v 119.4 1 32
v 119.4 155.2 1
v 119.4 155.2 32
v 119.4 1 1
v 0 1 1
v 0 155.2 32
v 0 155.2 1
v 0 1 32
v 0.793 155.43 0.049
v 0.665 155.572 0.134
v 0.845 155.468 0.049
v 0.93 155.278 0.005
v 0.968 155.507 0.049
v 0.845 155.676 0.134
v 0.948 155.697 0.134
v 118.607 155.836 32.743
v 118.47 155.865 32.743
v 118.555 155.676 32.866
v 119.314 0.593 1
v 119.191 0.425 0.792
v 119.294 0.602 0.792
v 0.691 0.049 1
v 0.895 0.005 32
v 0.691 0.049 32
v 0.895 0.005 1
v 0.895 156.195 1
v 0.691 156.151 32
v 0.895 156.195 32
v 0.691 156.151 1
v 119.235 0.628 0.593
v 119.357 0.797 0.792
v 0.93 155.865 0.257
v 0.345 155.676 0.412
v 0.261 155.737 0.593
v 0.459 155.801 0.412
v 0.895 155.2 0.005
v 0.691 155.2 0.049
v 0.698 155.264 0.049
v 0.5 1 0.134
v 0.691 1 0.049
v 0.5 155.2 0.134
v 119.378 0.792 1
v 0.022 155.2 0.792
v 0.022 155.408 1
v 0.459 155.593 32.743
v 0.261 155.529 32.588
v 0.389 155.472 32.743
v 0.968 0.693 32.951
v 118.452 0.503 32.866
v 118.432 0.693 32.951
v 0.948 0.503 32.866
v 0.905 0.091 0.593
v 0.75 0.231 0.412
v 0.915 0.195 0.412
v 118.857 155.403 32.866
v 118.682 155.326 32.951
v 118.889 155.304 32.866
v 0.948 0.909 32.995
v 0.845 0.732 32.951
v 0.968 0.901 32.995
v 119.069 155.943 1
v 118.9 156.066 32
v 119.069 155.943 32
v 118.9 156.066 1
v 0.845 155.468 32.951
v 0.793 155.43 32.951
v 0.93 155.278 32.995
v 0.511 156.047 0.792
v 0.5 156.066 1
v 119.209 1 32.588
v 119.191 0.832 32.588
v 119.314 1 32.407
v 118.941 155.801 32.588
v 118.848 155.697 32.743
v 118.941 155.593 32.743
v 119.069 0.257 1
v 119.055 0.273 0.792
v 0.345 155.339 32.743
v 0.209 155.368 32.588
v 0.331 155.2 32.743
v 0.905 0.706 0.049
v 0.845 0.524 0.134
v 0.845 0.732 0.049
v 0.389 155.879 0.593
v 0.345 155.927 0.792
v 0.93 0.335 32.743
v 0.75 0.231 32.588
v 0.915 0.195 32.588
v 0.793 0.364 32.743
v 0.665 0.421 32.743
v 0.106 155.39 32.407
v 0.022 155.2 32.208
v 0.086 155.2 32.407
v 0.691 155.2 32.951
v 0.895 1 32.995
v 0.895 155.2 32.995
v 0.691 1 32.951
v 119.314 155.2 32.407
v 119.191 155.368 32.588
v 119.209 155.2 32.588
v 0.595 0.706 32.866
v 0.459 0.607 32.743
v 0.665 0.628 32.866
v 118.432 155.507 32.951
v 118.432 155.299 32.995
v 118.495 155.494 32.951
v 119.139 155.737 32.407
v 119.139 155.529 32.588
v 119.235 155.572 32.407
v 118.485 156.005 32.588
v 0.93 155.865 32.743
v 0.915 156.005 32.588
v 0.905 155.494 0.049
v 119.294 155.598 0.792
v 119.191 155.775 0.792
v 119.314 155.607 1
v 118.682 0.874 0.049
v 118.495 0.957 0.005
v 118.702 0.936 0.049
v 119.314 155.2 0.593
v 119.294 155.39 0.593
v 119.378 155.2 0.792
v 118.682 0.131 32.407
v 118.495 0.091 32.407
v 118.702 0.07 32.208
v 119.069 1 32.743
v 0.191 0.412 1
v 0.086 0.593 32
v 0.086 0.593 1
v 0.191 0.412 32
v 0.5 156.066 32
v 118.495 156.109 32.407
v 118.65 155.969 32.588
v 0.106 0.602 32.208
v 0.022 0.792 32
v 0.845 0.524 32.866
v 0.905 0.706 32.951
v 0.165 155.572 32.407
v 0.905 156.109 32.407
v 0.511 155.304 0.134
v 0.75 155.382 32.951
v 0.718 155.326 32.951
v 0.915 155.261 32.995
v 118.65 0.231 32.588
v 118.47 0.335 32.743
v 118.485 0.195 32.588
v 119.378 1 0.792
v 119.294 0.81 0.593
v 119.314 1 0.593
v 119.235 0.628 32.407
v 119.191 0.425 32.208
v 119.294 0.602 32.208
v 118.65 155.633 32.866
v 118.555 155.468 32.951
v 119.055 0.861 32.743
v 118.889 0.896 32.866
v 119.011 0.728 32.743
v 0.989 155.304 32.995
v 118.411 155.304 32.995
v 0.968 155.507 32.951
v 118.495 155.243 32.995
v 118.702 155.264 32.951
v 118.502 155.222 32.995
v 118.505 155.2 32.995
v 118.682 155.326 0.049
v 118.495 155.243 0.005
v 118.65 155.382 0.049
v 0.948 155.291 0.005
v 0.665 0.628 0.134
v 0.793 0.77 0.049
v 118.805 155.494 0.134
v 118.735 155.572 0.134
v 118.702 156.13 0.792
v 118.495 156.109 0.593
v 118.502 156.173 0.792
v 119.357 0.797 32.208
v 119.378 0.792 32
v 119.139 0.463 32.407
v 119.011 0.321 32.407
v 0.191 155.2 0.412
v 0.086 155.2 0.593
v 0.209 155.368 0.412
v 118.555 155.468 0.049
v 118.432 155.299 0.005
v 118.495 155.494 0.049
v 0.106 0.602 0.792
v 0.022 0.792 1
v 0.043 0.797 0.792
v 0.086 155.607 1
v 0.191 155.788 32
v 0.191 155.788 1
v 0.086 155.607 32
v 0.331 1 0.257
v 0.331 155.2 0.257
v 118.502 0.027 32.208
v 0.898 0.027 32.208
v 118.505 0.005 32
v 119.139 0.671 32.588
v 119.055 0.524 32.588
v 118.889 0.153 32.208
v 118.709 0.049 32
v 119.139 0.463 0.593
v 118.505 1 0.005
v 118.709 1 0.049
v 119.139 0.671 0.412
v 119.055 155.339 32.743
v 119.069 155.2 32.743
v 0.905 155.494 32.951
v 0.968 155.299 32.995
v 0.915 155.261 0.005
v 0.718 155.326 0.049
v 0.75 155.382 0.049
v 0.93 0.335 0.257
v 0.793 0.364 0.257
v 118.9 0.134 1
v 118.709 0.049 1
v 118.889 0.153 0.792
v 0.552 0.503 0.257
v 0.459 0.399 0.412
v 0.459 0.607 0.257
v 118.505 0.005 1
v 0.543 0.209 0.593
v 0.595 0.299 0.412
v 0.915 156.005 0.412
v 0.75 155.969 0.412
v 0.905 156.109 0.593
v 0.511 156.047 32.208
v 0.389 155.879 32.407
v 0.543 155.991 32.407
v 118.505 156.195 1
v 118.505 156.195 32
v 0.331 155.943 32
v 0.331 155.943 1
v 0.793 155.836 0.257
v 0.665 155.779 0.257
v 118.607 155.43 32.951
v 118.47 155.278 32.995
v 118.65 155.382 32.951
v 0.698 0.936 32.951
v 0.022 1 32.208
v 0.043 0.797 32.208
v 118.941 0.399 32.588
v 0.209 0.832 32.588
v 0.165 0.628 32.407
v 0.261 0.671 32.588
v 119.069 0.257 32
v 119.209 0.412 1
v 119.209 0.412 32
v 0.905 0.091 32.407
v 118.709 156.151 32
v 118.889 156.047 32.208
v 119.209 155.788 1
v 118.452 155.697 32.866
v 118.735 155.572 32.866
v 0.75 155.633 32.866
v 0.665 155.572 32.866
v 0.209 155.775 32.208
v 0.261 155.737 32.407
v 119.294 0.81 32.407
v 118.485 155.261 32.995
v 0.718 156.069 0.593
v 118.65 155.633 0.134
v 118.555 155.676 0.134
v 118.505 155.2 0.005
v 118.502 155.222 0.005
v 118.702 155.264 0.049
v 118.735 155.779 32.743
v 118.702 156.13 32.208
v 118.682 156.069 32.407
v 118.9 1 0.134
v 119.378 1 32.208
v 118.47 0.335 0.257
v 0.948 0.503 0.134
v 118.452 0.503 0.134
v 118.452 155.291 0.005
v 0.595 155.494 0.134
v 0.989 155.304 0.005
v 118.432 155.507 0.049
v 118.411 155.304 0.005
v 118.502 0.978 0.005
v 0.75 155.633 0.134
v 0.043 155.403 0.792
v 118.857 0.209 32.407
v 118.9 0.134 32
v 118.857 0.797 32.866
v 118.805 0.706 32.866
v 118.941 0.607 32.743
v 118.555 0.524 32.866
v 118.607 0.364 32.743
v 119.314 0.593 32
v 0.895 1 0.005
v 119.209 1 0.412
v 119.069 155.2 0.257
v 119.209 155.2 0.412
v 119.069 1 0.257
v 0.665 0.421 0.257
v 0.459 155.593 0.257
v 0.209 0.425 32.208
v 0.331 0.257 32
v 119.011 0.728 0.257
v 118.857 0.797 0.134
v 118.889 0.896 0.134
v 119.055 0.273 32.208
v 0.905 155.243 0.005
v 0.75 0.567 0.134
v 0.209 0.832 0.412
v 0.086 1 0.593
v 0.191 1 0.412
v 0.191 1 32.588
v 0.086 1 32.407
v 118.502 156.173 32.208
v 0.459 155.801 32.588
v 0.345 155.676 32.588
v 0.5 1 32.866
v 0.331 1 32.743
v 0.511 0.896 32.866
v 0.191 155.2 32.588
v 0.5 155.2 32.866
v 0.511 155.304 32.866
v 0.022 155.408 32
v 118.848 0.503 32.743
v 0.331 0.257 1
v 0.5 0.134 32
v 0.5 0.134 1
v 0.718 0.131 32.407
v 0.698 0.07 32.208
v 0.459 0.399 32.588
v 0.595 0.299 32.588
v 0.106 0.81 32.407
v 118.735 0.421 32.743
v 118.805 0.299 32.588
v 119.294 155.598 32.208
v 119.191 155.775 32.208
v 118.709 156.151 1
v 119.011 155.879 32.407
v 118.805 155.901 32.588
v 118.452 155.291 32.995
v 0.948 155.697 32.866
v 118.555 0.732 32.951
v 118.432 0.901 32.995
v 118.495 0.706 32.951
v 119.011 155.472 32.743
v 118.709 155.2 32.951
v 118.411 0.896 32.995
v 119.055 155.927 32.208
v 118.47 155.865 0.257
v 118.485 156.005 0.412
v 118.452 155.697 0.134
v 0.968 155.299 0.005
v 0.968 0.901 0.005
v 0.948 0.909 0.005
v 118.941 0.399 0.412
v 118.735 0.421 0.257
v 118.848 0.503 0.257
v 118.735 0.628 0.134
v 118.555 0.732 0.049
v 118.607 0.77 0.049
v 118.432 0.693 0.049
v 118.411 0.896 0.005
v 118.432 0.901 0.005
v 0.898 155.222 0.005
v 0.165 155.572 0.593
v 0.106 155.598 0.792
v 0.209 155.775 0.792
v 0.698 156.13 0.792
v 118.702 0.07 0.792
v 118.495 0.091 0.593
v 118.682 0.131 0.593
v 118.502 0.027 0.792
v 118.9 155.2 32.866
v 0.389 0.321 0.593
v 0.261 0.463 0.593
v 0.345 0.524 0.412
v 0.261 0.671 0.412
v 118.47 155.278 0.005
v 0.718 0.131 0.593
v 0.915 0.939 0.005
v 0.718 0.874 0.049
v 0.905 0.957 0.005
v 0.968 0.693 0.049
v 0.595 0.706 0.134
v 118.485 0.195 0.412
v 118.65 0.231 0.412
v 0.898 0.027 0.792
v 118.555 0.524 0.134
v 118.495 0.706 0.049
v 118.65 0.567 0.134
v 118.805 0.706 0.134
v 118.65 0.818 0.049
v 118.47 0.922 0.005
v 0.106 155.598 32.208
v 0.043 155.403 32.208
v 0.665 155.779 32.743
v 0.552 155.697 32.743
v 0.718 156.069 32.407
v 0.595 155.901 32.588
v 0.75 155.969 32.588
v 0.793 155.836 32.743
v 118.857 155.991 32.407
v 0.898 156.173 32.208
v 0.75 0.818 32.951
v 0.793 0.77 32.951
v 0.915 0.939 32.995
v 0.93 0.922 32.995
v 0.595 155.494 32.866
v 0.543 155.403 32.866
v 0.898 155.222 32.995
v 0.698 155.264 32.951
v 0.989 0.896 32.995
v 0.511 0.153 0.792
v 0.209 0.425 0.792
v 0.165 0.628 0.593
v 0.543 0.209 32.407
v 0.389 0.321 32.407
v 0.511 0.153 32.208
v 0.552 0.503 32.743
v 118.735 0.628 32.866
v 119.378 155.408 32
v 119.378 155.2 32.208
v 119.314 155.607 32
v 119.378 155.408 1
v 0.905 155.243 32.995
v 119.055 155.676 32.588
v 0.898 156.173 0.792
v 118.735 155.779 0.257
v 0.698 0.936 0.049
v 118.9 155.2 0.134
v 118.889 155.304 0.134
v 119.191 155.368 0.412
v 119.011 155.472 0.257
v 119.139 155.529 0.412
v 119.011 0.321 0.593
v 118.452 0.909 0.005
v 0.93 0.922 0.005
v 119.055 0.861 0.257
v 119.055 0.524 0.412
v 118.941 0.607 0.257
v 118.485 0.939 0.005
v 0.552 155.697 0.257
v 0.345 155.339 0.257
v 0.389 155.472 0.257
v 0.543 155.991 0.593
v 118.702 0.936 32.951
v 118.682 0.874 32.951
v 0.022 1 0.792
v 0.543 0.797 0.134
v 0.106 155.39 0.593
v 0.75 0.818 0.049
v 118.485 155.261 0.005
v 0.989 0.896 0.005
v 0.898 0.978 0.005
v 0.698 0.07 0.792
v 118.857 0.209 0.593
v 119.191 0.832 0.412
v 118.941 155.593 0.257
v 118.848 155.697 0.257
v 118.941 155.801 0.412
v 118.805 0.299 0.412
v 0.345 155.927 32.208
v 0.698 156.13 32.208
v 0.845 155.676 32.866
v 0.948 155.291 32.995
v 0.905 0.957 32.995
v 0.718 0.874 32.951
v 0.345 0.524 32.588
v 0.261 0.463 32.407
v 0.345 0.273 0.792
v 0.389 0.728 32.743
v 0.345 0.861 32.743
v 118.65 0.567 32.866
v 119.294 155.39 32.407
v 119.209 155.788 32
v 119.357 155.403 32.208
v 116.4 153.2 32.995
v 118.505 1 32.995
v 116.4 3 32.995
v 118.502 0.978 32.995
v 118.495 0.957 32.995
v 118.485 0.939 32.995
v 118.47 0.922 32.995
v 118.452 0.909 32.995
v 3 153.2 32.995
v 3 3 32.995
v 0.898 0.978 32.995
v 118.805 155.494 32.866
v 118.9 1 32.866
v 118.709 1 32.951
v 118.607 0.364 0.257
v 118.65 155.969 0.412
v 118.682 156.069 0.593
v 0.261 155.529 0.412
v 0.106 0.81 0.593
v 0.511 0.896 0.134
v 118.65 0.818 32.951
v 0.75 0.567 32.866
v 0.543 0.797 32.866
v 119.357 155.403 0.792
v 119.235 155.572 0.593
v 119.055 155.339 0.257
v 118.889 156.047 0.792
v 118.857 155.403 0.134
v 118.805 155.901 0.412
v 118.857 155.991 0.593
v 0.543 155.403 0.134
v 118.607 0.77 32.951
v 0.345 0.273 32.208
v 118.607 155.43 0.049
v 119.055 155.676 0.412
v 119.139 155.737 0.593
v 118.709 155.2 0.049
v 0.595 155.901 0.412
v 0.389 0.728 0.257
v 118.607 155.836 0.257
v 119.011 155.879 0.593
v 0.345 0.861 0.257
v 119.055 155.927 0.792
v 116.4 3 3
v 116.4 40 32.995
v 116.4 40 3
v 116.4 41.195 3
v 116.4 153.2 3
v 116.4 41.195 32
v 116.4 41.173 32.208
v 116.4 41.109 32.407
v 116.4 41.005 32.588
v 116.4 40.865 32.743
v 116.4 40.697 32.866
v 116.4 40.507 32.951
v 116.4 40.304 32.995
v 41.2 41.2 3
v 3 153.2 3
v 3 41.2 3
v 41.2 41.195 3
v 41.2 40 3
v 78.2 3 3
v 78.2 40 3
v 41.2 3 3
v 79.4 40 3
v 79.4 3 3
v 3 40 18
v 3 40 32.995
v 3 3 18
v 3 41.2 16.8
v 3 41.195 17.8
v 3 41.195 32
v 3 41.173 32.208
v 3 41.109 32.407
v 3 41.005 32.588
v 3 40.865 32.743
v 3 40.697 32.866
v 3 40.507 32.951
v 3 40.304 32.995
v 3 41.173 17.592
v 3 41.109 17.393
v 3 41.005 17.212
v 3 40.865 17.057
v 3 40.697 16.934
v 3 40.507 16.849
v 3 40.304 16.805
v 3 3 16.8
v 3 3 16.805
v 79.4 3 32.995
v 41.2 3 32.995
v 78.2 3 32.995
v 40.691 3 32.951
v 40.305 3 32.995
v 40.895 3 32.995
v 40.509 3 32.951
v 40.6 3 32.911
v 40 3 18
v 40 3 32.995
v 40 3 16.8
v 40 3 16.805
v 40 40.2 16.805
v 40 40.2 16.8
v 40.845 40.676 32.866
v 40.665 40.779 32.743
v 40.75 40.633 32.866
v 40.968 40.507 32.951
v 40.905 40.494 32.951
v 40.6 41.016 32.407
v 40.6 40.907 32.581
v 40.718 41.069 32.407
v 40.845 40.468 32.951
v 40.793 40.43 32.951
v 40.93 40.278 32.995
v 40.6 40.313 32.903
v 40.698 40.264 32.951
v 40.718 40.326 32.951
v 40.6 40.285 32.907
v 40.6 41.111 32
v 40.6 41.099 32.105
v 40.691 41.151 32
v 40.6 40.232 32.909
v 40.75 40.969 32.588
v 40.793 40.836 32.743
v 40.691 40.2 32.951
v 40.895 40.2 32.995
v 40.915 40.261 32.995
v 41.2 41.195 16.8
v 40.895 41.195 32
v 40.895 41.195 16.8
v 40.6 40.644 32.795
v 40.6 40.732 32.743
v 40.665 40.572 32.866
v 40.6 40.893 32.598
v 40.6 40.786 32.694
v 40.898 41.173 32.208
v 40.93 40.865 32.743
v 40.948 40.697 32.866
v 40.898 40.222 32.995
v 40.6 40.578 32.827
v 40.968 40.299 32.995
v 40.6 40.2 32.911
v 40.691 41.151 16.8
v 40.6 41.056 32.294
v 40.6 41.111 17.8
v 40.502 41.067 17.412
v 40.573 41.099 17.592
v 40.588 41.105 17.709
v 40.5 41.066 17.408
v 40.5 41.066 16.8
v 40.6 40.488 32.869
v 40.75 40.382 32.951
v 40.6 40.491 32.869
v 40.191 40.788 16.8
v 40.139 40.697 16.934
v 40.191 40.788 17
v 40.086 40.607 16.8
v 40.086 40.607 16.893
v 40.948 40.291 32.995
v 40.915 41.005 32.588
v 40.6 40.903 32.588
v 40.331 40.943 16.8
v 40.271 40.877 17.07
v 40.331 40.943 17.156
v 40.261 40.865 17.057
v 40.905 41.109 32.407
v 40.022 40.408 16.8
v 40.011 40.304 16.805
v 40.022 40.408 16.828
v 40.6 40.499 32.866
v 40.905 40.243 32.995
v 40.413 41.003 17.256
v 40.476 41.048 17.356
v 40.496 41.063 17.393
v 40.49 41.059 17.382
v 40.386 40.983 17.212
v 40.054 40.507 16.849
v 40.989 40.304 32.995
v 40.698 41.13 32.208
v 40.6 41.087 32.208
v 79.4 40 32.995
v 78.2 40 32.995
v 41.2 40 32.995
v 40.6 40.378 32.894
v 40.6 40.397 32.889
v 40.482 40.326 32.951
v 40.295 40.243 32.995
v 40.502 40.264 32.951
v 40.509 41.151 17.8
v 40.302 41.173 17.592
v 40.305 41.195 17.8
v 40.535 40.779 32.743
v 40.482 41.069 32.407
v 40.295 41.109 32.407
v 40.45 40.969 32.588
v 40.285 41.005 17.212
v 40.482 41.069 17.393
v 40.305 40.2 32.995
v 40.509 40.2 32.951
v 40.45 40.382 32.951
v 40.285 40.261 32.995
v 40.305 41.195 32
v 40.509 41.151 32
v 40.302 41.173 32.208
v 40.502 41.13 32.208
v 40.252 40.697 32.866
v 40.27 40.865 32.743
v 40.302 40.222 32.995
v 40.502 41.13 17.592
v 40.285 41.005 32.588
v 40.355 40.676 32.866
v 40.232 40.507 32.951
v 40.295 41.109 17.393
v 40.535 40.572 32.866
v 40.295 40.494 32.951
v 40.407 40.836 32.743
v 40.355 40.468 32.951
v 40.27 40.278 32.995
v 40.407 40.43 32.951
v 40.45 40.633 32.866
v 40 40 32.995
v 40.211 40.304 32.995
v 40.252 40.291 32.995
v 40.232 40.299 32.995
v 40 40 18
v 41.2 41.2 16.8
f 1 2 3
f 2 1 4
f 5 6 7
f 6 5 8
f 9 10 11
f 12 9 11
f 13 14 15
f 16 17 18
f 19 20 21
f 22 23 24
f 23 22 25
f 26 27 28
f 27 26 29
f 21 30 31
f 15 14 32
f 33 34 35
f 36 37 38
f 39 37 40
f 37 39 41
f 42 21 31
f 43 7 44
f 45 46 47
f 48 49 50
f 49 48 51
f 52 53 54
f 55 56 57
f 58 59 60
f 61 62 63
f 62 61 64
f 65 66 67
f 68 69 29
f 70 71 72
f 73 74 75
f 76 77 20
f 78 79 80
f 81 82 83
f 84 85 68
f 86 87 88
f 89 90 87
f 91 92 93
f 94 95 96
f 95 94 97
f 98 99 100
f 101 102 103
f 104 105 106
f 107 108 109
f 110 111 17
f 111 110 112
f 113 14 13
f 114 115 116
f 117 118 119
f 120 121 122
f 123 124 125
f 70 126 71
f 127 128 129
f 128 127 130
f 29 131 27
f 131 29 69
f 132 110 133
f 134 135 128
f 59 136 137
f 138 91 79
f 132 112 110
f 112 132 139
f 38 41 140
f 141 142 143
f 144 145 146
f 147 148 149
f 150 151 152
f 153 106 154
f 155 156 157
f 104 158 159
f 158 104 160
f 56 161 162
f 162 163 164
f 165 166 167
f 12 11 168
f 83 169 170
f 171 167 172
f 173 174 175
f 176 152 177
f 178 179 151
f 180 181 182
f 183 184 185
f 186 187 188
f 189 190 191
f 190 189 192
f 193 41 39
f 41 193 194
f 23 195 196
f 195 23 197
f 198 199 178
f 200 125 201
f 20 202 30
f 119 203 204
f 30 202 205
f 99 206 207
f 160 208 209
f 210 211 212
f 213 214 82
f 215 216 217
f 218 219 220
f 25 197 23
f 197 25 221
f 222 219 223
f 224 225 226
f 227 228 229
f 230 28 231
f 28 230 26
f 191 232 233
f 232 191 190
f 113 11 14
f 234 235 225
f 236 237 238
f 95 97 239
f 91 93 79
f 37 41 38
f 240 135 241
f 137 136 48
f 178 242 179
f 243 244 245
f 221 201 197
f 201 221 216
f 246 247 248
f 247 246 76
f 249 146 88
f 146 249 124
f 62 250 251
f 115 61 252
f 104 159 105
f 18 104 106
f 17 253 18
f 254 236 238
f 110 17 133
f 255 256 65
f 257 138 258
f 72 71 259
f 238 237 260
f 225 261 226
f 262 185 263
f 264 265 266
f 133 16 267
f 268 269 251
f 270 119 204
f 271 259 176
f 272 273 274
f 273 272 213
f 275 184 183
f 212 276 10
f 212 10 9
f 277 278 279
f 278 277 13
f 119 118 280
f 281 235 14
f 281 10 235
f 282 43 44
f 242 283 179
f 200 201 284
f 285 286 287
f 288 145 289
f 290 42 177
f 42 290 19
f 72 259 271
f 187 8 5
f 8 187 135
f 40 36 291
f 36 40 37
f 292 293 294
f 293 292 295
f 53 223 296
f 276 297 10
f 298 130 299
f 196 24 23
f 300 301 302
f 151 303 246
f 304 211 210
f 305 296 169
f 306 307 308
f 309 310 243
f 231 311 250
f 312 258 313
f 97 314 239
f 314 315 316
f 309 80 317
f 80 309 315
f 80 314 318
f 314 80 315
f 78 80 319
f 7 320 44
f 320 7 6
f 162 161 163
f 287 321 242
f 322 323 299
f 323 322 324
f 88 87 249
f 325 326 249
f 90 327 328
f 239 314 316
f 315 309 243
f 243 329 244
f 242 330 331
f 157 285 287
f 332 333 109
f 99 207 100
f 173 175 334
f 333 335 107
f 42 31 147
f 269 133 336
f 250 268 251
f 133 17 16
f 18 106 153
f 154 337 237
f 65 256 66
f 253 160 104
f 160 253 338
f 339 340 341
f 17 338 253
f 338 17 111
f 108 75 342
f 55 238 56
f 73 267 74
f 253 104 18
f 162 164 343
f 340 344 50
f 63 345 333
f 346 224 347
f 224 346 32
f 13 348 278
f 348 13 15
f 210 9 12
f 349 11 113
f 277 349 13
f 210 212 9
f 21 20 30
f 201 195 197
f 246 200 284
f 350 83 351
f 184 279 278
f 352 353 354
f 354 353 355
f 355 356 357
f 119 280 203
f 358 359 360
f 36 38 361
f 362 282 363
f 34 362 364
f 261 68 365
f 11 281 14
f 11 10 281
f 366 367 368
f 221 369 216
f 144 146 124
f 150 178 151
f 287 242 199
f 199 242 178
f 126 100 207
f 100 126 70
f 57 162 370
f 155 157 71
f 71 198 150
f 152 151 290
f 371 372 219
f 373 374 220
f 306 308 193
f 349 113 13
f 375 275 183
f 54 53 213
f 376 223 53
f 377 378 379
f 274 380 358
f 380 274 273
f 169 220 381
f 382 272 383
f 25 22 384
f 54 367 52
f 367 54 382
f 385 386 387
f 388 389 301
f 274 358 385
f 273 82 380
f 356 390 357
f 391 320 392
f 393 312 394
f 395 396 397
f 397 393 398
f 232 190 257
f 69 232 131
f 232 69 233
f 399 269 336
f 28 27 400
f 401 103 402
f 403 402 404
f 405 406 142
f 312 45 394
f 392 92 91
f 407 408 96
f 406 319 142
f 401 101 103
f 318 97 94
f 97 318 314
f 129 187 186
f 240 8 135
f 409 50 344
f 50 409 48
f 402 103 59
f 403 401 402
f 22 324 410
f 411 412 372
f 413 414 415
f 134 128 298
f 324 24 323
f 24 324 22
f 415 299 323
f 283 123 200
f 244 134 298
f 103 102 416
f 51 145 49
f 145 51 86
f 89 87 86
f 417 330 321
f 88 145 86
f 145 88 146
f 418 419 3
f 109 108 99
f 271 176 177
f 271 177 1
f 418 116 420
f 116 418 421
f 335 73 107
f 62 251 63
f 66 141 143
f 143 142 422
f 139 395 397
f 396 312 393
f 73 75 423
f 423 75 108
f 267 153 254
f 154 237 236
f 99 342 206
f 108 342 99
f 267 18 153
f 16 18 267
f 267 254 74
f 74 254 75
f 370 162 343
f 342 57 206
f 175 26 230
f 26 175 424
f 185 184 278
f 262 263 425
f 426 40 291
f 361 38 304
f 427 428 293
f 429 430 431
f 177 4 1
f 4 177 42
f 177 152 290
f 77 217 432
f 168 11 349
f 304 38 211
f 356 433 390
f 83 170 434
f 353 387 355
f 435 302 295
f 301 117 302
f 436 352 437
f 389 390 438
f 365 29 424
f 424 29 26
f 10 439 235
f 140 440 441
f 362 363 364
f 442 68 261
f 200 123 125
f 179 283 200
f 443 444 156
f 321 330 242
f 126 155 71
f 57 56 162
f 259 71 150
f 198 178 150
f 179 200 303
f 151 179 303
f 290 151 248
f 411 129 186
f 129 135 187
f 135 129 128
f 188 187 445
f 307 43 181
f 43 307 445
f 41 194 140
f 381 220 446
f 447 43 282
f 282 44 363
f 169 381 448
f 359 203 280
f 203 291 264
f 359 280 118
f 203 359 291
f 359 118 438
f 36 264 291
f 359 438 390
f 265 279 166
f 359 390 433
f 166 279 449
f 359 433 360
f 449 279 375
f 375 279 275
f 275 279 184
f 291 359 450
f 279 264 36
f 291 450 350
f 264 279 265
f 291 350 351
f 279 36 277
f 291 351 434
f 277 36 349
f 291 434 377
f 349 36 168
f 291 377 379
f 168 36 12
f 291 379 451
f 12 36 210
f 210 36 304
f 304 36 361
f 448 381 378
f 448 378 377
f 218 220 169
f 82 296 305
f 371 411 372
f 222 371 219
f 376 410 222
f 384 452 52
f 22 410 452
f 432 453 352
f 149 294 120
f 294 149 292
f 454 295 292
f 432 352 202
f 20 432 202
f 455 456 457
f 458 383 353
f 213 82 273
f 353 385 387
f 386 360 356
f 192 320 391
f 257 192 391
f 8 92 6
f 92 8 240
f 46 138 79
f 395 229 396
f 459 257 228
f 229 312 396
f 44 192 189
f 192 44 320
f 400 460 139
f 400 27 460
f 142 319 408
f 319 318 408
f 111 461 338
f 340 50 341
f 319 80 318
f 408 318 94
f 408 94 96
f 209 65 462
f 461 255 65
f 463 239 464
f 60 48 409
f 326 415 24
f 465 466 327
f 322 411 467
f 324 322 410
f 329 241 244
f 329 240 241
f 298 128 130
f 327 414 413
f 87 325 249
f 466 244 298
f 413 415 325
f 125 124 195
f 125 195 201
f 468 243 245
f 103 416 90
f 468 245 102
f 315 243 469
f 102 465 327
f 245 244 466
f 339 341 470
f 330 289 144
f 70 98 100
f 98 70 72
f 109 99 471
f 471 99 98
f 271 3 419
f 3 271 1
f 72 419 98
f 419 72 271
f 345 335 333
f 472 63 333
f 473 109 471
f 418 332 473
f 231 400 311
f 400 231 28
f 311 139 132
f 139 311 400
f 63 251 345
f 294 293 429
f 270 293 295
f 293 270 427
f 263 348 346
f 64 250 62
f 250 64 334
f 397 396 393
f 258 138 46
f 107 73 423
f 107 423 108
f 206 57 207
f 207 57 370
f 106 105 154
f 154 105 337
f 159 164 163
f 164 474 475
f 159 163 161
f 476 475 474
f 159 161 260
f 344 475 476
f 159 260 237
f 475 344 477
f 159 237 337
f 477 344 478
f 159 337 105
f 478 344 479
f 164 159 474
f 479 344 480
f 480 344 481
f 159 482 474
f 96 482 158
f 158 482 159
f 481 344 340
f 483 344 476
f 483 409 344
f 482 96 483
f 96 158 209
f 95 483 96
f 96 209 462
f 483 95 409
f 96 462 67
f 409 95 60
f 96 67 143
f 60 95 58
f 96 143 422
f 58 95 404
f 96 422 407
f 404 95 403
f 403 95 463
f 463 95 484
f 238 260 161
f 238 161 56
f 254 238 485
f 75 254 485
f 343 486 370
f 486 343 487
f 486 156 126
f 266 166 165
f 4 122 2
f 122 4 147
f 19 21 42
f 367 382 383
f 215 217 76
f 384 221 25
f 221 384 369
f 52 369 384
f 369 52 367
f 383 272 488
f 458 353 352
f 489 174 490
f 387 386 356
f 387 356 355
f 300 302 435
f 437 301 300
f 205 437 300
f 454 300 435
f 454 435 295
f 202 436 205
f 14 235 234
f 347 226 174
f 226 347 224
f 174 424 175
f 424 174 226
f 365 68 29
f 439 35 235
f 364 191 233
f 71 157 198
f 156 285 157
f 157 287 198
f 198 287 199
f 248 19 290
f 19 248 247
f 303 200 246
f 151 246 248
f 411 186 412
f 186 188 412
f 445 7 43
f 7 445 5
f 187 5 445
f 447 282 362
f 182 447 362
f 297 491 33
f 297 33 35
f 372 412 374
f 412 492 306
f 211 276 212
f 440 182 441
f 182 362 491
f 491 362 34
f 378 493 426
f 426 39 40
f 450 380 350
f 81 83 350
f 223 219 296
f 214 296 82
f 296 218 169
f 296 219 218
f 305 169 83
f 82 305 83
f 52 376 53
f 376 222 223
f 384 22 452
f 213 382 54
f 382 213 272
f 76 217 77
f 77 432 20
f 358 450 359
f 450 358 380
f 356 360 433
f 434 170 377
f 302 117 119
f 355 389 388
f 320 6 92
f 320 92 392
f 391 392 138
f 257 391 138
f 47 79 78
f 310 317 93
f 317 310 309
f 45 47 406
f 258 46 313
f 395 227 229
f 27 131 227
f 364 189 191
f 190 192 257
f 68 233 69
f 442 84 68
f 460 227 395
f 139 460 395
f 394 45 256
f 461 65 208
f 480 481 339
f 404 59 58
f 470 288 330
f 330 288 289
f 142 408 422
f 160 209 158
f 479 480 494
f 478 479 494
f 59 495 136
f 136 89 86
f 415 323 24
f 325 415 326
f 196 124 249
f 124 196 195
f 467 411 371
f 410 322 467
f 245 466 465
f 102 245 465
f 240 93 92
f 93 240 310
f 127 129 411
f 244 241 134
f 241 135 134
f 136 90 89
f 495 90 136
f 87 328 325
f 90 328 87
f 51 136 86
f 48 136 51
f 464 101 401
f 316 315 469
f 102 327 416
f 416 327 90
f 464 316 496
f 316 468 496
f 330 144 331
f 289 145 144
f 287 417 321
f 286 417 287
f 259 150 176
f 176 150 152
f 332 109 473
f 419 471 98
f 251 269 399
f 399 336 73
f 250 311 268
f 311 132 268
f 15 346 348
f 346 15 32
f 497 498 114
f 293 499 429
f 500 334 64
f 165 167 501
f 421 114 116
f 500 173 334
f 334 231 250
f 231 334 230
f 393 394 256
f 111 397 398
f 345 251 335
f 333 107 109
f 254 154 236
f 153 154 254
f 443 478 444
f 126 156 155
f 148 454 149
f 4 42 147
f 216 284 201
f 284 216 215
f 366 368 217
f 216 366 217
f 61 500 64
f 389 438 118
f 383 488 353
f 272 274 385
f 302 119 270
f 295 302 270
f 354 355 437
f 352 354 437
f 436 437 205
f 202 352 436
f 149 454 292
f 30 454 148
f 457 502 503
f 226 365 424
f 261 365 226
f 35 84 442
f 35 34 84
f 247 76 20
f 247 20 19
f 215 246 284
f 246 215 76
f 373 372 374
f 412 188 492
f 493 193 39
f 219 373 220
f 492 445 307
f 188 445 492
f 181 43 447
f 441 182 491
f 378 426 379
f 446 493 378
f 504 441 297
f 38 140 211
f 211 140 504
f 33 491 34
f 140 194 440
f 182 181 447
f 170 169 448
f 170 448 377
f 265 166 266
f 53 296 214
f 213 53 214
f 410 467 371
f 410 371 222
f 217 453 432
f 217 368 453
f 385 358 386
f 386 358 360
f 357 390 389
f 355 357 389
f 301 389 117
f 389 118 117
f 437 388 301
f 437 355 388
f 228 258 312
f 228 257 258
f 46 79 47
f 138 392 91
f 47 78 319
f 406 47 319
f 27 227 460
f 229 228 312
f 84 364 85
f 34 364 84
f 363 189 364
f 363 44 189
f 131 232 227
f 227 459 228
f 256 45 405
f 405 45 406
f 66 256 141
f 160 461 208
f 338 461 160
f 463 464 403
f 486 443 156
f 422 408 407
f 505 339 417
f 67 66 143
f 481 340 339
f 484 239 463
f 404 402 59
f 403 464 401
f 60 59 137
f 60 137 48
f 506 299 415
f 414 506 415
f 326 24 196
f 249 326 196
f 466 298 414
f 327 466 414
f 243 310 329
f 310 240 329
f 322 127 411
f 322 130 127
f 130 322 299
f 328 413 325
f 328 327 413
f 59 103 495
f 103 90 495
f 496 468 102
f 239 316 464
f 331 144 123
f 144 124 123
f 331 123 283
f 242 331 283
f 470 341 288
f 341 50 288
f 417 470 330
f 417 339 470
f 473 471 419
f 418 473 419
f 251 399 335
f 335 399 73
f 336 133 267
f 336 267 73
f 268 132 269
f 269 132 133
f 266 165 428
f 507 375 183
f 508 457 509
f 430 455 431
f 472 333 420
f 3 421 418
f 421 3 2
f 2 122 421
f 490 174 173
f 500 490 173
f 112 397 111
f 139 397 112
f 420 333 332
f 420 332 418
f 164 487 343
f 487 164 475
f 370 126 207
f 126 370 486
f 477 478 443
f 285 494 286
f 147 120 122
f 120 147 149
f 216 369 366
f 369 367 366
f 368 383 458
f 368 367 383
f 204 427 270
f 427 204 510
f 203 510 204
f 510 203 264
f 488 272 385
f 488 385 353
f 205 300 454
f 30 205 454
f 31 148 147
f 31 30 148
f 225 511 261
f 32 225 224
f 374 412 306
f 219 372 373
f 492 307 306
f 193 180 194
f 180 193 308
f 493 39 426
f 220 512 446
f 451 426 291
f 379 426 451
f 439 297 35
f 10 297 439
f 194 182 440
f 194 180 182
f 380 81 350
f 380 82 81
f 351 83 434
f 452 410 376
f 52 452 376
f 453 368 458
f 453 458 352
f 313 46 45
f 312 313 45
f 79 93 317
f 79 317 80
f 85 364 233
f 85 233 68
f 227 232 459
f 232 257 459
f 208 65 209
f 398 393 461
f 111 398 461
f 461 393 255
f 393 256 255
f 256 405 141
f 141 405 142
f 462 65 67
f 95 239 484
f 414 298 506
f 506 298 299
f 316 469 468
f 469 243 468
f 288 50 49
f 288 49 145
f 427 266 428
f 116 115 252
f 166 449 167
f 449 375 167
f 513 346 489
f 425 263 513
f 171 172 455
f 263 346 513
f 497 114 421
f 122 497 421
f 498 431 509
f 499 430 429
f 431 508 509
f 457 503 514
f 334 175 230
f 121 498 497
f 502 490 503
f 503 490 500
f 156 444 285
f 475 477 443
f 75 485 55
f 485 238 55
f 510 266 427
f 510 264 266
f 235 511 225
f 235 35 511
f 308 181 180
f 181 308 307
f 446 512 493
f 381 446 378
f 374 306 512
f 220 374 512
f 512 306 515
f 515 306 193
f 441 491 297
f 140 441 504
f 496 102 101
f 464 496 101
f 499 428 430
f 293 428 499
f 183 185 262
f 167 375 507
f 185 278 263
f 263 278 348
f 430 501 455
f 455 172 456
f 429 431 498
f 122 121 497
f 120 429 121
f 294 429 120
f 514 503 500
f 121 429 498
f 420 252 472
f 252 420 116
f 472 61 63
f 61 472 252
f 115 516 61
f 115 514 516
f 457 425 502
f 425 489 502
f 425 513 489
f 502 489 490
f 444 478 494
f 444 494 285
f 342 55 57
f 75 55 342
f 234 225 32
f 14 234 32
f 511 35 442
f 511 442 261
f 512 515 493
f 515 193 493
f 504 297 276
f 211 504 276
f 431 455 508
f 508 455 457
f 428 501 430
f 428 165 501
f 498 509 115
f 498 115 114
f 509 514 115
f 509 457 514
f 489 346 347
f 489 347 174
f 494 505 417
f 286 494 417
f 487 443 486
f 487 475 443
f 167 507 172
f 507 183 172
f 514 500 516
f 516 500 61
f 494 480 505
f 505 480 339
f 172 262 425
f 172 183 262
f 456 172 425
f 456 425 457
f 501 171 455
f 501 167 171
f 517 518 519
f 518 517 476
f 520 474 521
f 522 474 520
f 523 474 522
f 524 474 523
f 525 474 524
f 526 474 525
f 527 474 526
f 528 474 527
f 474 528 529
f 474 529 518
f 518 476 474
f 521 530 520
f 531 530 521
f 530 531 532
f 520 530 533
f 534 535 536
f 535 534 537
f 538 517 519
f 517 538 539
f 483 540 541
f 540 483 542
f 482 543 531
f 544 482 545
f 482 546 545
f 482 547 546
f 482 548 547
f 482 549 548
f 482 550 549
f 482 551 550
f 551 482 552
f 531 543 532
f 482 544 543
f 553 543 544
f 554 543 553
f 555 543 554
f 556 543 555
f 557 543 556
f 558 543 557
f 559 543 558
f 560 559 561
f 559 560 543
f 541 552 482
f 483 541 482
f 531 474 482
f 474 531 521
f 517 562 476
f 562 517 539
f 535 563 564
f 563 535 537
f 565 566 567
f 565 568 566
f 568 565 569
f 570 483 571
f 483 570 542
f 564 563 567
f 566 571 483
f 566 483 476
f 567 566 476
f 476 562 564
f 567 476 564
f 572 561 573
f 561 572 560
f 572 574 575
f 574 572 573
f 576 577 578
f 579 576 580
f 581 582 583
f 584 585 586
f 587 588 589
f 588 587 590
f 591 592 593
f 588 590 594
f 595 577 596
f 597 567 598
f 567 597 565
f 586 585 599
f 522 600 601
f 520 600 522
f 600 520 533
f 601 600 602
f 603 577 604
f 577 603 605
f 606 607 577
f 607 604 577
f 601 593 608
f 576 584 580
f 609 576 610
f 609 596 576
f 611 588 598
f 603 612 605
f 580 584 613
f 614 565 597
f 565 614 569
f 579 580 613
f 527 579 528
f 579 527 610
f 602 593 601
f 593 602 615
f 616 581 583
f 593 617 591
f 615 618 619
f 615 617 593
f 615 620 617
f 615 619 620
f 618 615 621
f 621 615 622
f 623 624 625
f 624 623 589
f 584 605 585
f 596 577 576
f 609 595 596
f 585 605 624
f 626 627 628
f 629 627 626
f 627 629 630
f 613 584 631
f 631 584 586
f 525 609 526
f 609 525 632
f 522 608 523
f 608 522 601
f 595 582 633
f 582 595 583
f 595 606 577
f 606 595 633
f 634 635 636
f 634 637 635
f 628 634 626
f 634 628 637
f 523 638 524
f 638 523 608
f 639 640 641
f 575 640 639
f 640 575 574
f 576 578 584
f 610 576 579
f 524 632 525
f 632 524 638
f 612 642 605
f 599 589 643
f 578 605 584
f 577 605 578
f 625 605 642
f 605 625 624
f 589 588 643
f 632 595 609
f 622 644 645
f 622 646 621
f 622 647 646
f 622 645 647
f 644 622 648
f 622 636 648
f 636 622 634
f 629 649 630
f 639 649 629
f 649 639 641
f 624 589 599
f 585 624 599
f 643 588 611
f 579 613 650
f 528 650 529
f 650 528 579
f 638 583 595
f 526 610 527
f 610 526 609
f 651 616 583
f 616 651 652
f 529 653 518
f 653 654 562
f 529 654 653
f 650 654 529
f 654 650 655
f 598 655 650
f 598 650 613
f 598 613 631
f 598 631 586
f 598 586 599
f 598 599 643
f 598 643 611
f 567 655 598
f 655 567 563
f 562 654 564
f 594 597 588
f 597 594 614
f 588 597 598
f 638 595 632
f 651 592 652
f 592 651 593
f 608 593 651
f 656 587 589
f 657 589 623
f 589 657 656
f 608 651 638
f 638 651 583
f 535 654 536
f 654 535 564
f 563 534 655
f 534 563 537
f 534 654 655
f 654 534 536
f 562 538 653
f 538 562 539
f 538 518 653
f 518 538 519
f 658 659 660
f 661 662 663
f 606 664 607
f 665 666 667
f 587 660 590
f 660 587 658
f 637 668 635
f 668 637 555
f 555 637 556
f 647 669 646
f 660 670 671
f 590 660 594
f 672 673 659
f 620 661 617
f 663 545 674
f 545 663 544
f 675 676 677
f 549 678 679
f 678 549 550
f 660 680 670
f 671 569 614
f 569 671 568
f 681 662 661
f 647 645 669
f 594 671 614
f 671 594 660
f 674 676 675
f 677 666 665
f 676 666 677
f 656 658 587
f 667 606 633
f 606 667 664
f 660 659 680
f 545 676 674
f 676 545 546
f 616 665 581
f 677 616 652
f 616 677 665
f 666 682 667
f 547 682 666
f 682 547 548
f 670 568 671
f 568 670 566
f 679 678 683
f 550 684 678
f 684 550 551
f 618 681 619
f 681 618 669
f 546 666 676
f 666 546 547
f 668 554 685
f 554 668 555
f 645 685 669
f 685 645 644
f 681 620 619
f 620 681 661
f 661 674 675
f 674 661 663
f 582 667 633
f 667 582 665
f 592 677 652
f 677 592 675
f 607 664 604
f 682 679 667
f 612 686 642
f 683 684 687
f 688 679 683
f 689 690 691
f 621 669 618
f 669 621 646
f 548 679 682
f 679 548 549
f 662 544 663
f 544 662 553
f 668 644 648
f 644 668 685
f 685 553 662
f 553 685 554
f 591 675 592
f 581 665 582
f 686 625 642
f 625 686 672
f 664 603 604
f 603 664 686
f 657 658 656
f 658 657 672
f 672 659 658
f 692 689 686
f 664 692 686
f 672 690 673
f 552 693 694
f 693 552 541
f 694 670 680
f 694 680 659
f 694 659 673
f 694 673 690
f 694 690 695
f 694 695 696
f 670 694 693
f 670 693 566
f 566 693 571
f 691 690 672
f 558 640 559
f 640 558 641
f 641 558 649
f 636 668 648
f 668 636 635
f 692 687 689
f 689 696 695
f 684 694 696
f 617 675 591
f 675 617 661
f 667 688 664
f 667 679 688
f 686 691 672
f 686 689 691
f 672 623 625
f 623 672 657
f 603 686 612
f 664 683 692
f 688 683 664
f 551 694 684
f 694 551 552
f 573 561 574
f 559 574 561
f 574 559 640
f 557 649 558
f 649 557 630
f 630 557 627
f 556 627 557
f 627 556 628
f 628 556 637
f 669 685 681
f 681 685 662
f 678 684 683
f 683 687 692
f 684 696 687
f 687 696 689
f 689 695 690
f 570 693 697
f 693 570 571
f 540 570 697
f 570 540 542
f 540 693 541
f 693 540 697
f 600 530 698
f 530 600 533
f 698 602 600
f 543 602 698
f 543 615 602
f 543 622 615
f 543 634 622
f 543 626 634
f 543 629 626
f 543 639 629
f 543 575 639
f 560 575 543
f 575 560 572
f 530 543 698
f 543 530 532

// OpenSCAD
// Download both files into the same directory and make a copy of this template for each project. Adjust the variables and values as needed to override the defaults in this file as needed. In this way you can replace the `Ultimate_Box_Generator.scad` file with a new version without having to track and restore your changes.

// If you want to use any framework variables in calulations you must import them here. If you want to also change the variable you must use a second line below to do that.
wall=wall;
internal_wall=internal_wall;

// Include the framework. You can change the prefix to load from a shared path.
include    <Ultimate_Box_Generator.scad>;

// At this point you can start to adjust builtin varaibles and create your own. There are also some examples of more complex boxes at the end of the file.


// Parts to render. To do more complex opperations disable these and manually call make_box() and make_lid() instead.
show_box=true;	// Whether or not to render the box
show_lid=true;	// Whether or not to render the lid. To make open boxes with no lid set `show_lid=false` and `lid_type=5`.

// General Settings
//comp_size_deep = 12; // Depth of compartments
//comp_size_x = 50;	 // Size of compartments, X
//comp_size_y = 35;	 // Size of compartments, Y
//wall = 2.5;		    // Width of wall, see `internal_wall` below for alternate inner wall size.
//repeat_x = 1;		// Number of compartments, X
//repeat_y = 1;		// Number of compartments, Y
//tolerance=.15;      // Tolerance around lid.  If it's too tight, increase this. If it's too loose, decrease it.

// Box Rounding
//box_corner_radius=0; // Add a rounding affect to the corners of the box. Anything over `wall` will cause structure and lid problems.
//internal_corner_radius=0; // Add a rounding affect to the inside.
//mesh_corner_radius=0; // Leave a radius around each corner of the mesh. May hep with bridges.
//corner_fn=30;

// Supress individual walls.
//supress_walls_x=[]; // These are the walls running along the X axis. It should be an array of size [repeat_y-1][repeat_x].
//supress_walls_y=[]; // These are the walls running along the Y axis. It should be an array of size [repeat_x-1][repeat_y].
// Example for repeat_x=4, repeat_y=3:
//supress_walls_x=[[1,0,1,1],[0,1,0,1]];
//supress_walls_y=[[1,0,1],[0,1,1],[1,1,1]];
//supress_sides=false; // [X, Y, X, Y] Cutout/supress some sides. this may behave baddly with compartments or mesh.
//supress_sides_radius=wall; // Add a rounding to the cutout.
//supress_sides_offset=0; // 0, wall, [X, Y, Z] adjsut the coutout in all directions. + to grow, - so shrink
//supress_sides_fn=30;

// Mesh Settings
// To make rounded corners and no mesh use any `mesh_type` > 0 and set `strut_gap` to a high value.
// 0: No mesh, solid wall.
// 1: Single direction mesh.
// 2: Two direction cross mesh and 90 degree angle to eachother.
// 3: Two direction mesh but mirrored around 90 axsis instead or rotated 90 degrees.
// 4: Calculate angle across the diagonal of each opening. You will also want to change `strut_gap` to a large number and set `strut_count_min=1`.
// 5: No mesh, empty wall.
// 6: Honycomb. Also set `strut_width=wall/4` and `strut_gap=wall*2`. To big of a `strut_gap` may fail to print. Other shapes can be generated with `mesh_fn` and reducing `mesh_inset_padding` may help.
//mesh_type=0; // Mesh type, see above.
//mesh_rotation=0; // 0-90 degrees.
//mesh_alt_rotation=mesh_rotation; // Alternate rotation for top and bottom faces.
//mesh_do_sides=true; //[true, true, true, false] Include mesh on each side along axis. [X, Y, X, Y]
//mesh_do_bottom=false; // Include mesh on bottom plate.
//mesh_do_top=true; // Include mesh on top piece.
//mesh_do_interior=false; // Include mesh on inner walls.
//mesh_inset_padding=wall; // Leave some solid material before building strut frame. Anything less then wall/2 will likely fall apart.
//mesh_fn=mesh_type == 6 ? 6 : 40; // Complexity of curves in mesh's, increese for smoother curves.
//strut_width=wall*2; // Width of each strut, 0=hollow.
//strut_gap=wall; // Width of the air gap between each strut. 0=fine air gaps.
//strut_count_min=0; // Optinal minimum number of struts regardless of size calulations.
//alt_strut_width=strut_width; // Width of struts going the other directions.
//alt_strut_gap=strut_gap; // Width of gap going the other direction.
//alt_strut_count_min=strut_count_min; // Optinal minimum number of struts regardless of size calulations.
//mesh_overflow=0; // Extra rows to add to the mesh. For example in the Honeycomb partial hexegons will be created along the edges.

// Lid Settings
// 0: No Lid. top may be rounded and can cause other rendering changes.
// 1: Lid that slides off in the x direction.
// 2: Lid with a snapped in hinge that rotates open
// 3: Lid that snaps down onto the box. Also need to change lid_height to around 1.5mm.
// 4: Stackable version of cover 1 there boxes slide into one another. You will need one cover for the last box. (Not tested)
// 5: Oversized lid sits on top and has sides that extend down. (Needs snapp support)
lid_type=0; // Lid type, see above.
//has_thumbhole=true; // Add gripping locations for easy opening.
//has_coinslot=false; // Add slot in the top for dropping in components.
//has_snap=true; // Add small ridges or snaps to lids to help keep them closed.
//coinslot_x=20;	// Size in X direction
//coinslot_y=2.5;	// Size in Y direction
//coinslot_corner_radius=0; // rounded coinslot corners if >0; best if less than half the shorter coinslot dimension
//z_tolerance=0;   // Z tolerance can be tweaked separately, to make the top of the sliding lid be flush with the top of the box itself.
//extra_bottom=.15; // Extra bottm wall height to fit type 4 slider.
//hinge_inset=.75; // Size of the hinge connection.
//snap_inset=.25; // Amount of overhang for snaps to snap into place.
//snap_tolerance=tolerance; // You may need to add tolerance around lid and snaps to let them move freely.
//lid_offset=3;		// This is how far away from the box to print the lid
//lid_height=wall*2;  // Height of lid. Must be greater than wall width for a `lid_type=5` lid to work. On Lid 3 is the depth of the inset snap.
//lid_fn=40; // Increese if printing thicker walls.
//lid_alt_offset=false; // Move lid in X instead of Y for printing.

//Internal Structure (You may need to turn off `mesh_do_sides` or `mesh_do_bottom` for good results.)
// You can also use `make_wall()` to manually add your own walls.
// 1: Rounded bottom frame.
// 2: Hexegon bottom frame. (To make this shape perfect set `comp_size_deep` to the width between to edges of the tile and set `comp_size_x` or `comp_size_y` to this this: `comp_size_deep / sqrt(3)*2`.
// 3: Rough bottom for make bits sit unevenly. (Partial)
// 4: Verical rounding on cordner. Set `internal_size_deep` to `comp_size_deep` and `internal_size_circle` to the shortest `comp_size` for a circle.
// 5: Vertical hexegon. Retulst may varry.
//internal_type=0; // Internal structure, see above.
//internal_rotate=false; // On lid axis or rotate to opposite.
//internal_size_deep=comp_size_deep/2; // How far into the box to start the internal structure. Should be `comp_size_deep/2` for type 1-2, `wall` for 3, or comp_size_deep for type 4-5.
//internal_size_circle=internal_type==1 ? internal_size_deep : internal_size_deep * 2 / sqrt(3); // Use this calculation, or the shorter comp_size for type 4-5.
//internal_fn=internal_type==1 || internal_type==4 ? 60 : 6; // Complexity of internal curves, may need to increase for larger or smoother curves.
internal_wall=1.2; // Custom size for internal walls.

// Text Settings
// 0: None.
// 1: Cutout. Remove material formt he wall.
// 2: Raised. If a mesh is ued part of it is filled in to hold the text. Lids 0 and 3 are printed upside down by default. With this option used they will require supports regardless of the orrientation printed.
//text_type=0; // Text type, see above.
//text_depth=wall/6; // Distance to cutout text or raise it. User `wall` to cut through.
//text_size=5; // Font Size.
//text_font="Courier New:style=Bold"; // Use Hepl -> Font List to see options.
//text_message="Red Player"; // Message Text, or use `["Line 1", "Line 2"]` for multiline.
//text_message_compartments=false;//[["AA", "BB", "CC"], ["AB", "BC", "CD"]]; // Custom text for compartments in top or bottom. Also support multiline as `[[ ["A", "B"] ]]`.
//text_sides=true;//[true, true, true, false]; // Sides to put text on, [X, Y, X, Y]
//text_top=true; // Put Text on the top.
//text_bottom=false; // Put Text on the bottom.
//text_rotation=0; // Rotate the top and bottom text by X degrees. 90 will rotate from the X axis to the Y axis.
//text_offset=0; // Text is verticaly centered in the wall. This may look "off" due to casing or hanging tails. You can manually adjust the vertical alignment with this setting.
//text_fn=30; // Complexity of the letters, may need to increese with larger fonts.
//text_backdrop_scale=[.9, 1.5]; // Font size scaleing used on the backdrop when `text_type=2` is used on sides with a mesh.

// Complex Structure
//make_complex_box=false; // Use an array of objects from `complex_box` to create many smaller boxes within the larger box.
//internal_grow_down=true; // If set compartments will be extruded into the larger box from the top to make a flush surface. (May make a model that uses a lot of material.
//internal_empty_bottom=false; // If set the area blow each box will be empty. This will not be printable on a FDM printer unless supports are included internally but still may save material and print time.



// In addition you can set `show_box=false;` and then call `make_box()` manually to join and remove more structure to it like in this example.
/*show_box=false;
difference() {
    make_box();
    translate([0, comp_size_y/2 + wall, 0])
    rotate([0, 90, 0])
    cylinder(comp_size_x +wall*2, 10, 10);
}*/

// You can also use calls to `make_internal_box` to create more complex boxes within a larger box that share a single lid.
/*show_box=false;
make_box();
intersection() {     
    faction_x=10; faction_y=comp_size_y; faction_z=5; faction_repeat_x=3; faction_repeat_y=1;
    faction_size_x=calc_size(faction_repeat_x, faction_x, wall=internal_wall, internal_wall=internal_wall);
faction_size_y=calc_size(faction_repeat_y, faction_y, wall=internal_wall, internal_wall=internal_wall);
    
    translate([wall, wall, wall])
    cube([faction_size_x - wall, faction_size_y - wall*2, comp_size_deep]);
            
    translate([wall-internal_wall, wall-internal_wall, wall-internal_wall])
    union() {
        translate([0, 0, 0])
        make_internal_box(faction_x, faction_y, faction_z, wall=internal_wall, repeat_x=faction_repeat_x, repeat_y=faction_repeat_y);
    }
}*/

// This exmaple wil make a complex series of boxes in a larger container. The object's can be used to position other oebjects and create internal structure.
/*comp_size_x = 200;
comp_size_y = 200;
comp_size_deep = 200;

internal_wall=wall/2;

comp1=make_object(x=10, y=30, z=45, offset_x=0, offset_y=0, repeat_x=3, repeat_y=1, color="Red");
comp2=make_object(x=35, y=40, z=45, offset_x=comp1[4][0], offset_y=0, repeat_x=1, repeat_y=1, color="Pink");
comp3=make_object(x=35, y=30, z=45, offset_x=comp2[4][0], offset_y=0, repeat_x=1, repeat_y=1, color="Orange");
comp4=make_object(x=150, y=100, z=75, offset_x=0, offset_y=comp1[4][1], repeat_x=1, repeat_y=1, color="Blue");

complex_box=[
    comp1, comp2, comp3, comp4,
    
];
make_complex_box=true;*/
comp_size_x = (37*3)+(1.2*2);
comp_size_y = (37*1)+(1.2*1)+112;
comp_size_deep = 30;
box_corner_radius=1;
wall= 3;
comp1=make_object(x=37, y=37, z=comp_size_deep, offset_x=37+1.2, offset_y=0, repeat_x=2, repeat_y=1);
comp2=make_object(x=37, y=37, z=comp_size_deep-15, offset_x=0, offset_y=0, repeat_x=1, repeat_y=1);
complex_box=[comp1,comp2];
make_complex_box=true;


// Some notes on complex prints:
/* OpenSCAD expereicne is required to do pretty much any type of customization or complex opperations. This will essentaily jsut make the containers within one larger object with a single lid. Alternatly multiple boxes could be reated and then joined together with translations to make a larger object with multiple lids. 
   Due to how variables are passed in OpenSCAD it can be tricky to get the parameters set on the parent box and child boxes as you want. It is best to use global variable assignmets to set the child box parameters, then pass overrides to the `make_box()` call yourself. (You have to also set `show_box=false;` if you ddo this.)
  */
